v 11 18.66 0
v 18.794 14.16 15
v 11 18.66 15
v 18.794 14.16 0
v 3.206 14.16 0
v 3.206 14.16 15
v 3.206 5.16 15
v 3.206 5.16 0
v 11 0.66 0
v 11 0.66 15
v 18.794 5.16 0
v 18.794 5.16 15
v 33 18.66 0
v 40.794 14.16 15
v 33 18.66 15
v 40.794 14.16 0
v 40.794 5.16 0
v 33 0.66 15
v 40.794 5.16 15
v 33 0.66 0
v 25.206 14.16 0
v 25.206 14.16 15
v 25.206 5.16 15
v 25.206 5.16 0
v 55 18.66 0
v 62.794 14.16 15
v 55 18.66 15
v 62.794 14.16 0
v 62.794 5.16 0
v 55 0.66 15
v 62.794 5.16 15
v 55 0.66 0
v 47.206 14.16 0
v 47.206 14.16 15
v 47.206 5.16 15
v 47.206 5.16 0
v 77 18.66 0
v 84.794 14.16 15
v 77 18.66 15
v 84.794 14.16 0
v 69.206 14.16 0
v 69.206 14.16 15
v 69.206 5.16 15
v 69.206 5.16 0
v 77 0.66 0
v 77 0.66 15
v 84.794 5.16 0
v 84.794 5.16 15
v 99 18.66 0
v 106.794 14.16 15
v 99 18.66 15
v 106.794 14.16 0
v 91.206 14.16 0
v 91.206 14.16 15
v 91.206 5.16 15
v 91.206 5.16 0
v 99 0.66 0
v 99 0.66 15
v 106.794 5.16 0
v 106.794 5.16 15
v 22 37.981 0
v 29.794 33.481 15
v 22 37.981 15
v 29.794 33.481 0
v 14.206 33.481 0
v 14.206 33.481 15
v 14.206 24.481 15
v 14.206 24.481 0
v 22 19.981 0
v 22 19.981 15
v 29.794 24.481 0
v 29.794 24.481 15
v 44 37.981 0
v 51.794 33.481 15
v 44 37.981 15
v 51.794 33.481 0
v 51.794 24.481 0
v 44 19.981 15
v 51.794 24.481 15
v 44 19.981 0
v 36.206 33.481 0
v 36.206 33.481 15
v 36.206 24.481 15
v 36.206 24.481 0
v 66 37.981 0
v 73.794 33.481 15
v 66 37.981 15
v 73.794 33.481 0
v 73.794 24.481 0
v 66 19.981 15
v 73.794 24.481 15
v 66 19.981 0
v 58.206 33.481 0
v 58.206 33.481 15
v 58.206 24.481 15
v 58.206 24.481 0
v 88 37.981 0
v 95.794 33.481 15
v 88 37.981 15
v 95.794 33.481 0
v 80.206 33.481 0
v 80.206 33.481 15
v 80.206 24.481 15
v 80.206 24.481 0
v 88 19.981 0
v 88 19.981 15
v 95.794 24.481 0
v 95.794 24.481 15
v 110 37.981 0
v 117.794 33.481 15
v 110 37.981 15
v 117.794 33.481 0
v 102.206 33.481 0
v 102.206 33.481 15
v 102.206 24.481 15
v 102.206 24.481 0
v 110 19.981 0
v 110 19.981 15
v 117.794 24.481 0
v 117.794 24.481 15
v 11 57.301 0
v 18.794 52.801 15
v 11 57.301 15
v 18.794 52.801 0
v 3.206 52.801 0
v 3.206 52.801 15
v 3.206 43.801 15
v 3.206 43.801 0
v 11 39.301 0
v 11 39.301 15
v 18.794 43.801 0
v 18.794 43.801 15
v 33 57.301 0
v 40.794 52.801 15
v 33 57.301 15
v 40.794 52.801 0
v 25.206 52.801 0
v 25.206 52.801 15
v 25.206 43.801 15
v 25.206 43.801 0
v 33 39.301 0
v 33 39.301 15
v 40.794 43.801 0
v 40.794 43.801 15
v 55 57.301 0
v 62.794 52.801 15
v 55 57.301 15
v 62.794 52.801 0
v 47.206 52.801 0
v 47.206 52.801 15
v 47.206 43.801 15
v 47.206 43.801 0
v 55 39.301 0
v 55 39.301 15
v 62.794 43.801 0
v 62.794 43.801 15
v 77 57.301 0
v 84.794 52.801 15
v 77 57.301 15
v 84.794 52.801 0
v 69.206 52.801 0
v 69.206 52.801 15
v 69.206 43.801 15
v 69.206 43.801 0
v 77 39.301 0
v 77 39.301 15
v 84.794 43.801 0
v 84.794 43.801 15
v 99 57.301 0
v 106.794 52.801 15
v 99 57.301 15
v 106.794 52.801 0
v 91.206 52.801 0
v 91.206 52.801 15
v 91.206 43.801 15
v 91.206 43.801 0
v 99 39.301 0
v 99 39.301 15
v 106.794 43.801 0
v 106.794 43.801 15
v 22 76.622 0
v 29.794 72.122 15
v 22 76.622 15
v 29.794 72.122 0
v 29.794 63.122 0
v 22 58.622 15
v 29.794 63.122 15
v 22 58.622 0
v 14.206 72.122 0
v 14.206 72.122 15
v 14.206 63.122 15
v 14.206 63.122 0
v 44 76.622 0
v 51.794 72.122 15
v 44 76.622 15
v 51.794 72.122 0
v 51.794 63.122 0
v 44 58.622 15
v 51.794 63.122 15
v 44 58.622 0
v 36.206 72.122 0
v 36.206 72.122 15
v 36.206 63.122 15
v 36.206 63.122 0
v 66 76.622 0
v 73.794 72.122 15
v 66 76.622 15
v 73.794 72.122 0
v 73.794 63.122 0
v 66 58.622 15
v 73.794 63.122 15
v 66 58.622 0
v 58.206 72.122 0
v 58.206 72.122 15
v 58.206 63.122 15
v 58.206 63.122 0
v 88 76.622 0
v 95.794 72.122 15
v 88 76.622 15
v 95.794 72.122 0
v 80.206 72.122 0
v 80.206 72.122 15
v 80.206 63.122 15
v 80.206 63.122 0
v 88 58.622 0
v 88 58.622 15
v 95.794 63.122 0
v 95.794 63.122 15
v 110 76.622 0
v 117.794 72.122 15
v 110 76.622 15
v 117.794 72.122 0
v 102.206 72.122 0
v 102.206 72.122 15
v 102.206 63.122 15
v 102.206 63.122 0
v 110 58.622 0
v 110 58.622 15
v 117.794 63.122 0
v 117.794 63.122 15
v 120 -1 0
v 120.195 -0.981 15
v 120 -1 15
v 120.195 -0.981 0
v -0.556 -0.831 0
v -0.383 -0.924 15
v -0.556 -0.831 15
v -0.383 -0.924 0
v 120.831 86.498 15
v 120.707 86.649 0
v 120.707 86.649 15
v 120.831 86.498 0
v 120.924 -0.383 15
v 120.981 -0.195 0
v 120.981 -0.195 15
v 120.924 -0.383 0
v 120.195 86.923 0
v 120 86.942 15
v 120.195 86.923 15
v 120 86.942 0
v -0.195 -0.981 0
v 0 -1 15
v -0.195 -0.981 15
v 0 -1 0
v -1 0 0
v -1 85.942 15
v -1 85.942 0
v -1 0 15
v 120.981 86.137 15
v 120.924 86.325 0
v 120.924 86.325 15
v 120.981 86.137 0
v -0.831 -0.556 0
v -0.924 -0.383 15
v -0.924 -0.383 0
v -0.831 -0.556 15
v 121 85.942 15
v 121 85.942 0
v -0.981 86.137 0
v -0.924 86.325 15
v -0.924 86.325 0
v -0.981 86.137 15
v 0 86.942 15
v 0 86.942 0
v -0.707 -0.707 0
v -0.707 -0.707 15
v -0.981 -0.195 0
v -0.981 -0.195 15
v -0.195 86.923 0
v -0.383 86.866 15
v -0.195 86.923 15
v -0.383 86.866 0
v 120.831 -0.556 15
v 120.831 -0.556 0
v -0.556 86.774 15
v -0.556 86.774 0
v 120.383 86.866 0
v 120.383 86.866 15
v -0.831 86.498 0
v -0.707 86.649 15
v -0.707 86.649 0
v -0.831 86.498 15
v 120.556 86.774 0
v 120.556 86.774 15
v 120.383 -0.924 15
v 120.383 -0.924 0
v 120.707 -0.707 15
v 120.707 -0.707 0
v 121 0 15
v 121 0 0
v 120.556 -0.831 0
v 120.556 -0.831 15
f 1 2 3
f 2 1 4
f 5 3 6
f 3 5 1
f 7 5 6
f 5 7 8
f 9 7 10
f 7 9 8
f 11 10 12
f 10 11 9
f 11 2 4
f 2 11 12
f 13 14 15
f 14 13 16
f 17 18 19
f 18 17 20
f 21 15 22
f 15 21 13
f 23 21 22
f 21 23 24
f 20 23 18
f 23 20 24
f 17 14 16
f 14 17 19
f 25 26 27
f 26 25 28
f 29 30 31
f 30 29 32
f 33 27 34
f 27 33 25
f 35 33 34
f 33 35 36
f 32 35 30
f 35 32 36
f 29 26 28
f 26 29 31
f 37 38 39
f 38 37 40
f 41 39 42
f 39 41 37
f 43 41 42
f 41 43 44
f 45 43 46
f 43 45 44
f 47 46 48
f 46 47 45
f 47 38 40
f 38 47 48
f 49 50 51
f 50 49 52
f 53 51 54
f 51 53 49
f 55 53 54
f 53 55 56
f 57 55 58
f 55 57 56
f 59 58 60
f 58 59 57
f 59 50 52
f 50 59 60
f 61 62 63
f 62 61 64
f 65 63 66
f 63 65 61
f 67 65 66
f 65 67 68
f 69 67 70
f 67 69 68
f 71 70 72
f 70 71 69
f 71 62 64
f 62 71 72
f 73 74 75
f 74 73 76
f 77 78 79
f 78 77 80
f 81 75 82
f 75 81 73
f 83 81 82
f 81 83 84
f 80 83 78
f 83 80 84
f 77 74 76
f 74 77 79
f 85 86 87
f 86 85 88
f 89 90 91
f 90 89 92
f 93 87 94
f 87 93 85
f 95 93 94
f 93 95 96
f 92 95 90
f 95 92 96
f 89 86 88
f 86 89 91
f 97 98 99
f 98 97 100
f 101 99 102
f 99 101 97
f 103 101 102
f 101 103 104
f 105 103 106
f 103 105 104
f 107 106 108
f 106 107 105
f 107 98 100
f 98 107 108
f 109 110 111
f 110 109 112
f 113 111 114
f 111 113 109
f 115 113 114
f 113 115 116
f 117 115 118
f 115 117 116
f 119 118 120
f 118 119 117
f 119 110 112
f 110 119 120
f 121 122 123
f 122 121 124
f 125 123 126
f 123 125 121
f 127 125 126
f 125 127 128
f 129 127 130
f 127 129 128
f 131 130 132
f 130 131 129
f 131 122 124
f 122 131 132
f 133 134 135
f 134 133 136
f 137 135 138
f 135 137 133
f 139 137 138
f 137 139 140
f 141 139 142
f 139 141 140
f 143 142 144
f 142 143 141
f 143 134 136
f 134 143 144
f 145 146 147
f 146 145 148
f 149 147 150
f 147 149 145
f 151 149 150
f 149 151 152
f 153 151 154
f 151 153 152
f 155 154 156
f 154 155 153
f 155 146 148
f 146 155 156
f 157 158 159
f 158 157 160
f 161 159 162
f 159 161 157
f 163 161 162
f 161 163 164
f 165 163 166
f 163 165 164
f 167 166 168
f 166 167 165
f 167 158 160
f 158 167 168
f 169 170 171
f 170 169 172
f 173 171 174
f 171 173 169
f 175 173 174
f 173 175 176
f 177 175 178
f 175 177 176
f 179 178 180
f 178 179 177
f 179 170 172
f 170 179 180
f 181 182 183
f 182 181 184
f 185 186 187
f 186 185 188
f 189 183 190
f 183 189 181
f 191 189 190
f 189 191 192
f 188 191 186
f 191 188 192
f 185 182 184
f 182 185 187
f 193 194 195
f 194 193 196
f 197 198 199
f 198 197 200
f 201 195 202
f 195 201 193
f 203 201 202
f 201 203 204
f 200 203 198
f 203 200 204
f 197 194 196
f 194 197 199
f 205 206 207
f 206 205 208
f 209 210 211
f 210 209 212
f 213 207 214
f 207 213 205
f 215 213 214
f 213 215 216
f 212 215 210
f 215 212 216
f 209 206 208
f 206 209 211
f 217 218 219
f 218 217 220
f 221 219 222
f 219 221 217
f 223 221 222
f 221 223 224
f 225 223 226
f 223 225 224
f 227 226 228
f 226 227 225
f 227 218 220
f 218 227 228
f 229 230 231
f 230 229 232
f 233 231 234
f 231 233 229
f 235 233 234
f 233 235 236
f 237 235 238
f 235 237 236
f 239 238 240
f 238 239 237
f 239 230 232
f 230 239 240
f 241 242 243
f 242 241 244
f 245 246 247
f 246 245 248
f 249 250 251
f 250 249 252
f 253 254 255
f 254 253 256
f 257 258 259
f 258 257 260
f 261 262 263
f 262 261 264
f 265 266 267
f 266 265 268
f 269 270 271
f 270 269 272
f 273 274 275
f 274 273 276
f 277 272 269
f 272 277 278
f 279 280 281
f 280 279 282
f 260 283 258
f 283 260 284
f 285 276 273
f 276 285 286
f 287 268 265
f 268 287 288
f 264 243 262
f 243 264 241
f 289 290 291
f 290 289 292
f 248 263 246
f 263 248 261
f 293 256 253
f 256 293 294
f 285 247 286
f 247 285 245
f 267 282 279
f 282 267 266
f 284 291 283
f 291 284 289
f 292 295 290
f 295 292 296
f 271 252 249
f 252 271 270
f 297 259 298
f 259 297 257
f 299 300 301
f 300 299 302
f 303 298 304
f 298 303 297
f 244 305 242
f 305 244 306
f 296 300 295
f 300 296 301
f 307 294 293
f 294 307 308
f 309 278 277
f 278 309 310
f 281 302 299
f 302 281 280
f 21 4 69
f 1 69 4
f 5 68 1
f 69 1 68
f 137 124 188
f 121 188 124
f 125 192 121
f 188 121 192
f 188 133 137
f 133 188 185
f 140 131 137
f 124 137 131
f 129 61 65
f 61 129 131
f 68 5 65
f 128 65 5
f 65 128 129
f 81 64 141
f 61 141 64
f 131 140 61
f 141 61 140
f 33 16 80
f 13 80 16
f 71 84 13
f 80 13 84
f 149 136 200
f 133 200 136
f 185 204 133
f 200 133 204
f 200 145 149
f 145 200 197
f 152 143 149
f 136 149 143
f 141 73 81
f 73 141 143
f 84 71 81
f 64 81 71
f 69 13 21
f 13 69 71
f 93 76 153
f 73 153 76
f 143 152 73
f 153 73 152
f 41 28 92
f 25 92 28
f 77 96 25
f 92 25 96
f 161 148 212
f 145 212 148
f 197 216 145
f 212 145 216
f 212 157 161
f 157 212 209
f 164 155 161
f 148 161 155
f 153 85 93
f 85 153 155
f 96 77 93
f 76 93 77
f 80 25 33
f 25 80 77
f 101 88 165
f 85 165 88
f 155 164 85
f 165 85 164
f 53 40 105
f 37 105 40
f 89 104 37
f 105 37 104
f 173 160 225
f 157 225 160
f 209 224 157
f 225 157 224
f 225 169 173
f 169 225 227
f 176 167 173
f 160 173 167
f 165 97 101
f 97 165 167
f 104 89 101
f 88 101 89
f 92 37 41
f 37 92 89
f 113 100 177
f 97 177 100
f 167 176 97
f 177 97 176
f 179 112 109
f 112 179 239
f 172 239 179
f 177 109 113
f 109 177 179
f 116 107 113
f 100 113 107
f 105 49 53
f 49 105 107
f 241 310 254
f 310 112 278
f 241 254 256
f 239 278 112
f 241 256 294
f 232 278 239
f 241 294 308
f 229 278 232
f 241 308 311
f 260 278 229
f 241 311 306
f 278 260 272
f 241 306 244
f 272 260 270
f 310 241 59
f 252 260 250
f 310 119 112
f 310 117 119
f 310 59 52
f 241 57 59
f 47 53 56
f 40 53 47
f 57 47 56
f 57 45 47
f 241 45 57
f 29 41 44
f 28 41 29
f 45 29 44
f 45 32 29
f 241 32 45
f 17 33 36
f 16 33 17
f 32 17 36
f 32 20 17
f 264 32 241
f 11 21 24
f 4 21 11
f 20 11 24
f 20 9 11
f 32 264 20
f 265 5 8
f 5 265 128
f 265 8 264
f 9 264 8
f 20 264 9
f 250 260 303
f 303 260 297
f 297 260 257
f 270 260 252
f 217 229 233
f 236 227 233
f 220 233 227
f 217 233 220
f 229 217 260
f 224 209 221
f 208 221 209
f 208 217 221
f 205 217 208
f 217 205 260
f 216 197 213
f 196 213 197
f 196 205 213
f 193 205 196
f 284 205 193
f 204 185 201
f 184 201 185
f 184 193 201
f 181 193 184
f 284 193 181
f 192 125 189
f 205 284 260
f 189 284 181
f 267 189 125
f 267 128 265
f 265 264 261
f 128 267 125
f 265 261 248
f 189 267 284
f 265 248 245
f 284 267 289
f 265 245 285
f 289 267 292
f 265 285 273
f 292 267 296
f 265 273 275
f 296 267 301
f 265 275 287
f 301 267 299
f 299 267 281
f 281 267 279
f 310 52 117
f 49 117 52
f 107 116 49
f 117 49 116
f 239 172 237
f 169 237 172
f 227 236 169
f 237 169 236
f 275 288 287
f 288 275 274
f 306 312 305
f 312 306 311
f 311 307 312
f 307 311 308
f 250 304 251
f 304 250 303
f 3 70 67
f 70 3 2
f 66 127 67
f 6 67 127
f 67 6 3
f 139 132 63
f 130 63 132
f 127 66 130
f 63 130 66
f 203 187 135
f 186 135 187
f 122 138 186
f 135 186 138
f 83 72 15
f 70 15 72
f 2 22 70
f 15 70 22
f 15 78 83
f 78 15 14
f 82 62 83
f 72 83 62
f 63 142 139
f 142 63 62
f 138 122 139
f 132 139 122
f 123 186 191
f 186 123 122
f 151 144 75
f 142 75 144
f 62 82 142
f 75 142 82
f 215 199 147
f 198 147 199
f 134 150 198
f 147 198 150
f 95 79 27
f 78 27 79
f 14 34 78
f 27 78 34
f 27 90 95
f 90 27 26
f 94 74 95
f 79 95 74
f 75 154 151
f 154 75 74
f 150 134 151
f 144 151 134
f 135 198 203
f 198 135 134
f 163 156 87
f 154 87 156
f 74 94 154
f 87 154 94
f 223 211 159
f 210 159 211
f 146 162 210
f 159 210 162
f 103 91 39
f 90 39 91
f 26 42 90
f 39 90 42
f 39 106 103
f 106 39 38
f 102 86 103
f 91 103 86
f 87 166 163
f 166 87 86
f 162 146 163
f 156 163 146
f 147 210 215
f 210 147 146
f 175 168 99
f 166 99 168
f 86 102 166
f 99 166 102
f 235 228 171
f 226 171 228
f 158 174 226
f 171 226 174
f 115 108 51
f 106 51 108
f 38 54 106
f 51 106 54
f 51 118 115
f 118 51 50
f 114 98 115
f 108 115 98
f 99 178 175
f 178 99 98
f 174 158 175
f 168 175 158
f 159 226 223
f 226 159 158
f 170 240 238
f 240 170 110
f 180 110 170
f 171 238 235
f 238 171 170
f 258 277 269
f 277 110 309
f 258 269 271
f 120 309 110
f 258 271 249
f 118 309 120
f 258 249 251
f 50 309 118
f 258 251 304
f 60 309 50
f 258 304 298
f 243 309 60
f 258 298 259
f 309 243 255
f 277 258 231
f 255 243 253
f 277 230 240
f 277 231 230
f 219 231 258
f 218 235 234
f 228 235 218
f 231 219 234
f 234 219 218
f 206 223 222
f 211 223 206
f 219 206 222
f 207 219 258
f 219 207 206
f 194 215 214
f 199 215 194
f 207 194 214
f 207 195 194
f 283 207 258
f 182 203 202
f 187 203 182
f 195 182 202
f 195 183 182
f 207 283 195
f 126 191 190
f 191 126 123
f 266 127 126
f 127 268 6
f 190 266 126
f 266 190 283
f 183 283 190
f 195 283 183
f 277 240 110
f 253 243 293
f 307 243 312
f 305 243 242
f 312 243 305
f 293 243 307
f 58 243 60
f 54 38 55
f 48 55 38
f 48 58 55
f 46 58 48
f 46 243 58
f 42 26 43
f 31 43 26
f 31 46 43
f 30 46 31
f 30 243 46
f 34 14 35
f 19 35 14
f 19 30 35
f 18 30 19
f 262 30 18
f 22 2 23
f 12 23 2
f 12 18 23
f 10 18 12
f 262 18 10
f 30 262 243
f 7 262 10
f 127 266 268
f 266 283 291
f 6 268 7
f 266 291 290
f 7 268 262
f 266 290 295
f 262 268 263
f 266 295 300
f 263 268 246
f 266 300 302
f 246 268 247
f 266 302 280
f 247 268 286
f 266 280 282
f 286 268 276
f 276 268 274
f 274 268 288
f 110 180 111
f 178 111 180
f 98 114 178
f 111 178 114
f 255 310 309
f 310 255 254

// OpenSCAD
// Honeycomb Grid Pattern
// Creates hexagonal grid patterns for organizers, decorations, or infill
// License: CC0 (Public Domain)

/* [Grid Size] */
// Number of hexagons in X direction
cells_x = 5; // [2:20]

// Number of hexagons in Y direction
cells_y = 4; // [2:20]

// Size of each hexagon (flat-to-flat distance)
cell_size = 20; // [5:50]

/* [Dimensions] */
// Wall thickness between cells
wall_thickness = 2; // [1:0.5:5]

// Grid height (depth)
grid_height = 15; // [3:50]

// Add a bottom plate
include_bottom = "no"; // [yes, no]

// Bottom plate thickness
bottom_thickness = 1.5; // [0.5:0.5:5]

/* [Style] */
// Cell shape
cell_shape = "hexagon"; // [hexagon, circle, rounded_hex]

// Rounding for rounded_hex
hex_rounding = 2; // [0:5]

/* [Quality] */
// Render quality
$fn = 32; // [16:64]

/* [Hidden] */
// Hexagon math
hex_radius = cell_size / 2;
hex_apothem = hex_radius * cos(30);  // Distance from center to flat edge
col_spacing = cell_size + wall_thickness;
row_spacing = (hex_apothem * 2) + wall_thickness;

// Calculate overall dimensions
total_width = (cells_x * col_spacing) + (cell_size / 2);
total_depth = (cells_y * row_spacing) + hex_apothem;

module honeycomb_grid() {
    difference() {
        // Outer frame
        linear_extrude(height = grid_height)
            offset(r = wall_thickness/2)
            square([total_width, total_depth]);
        
        // Hexagonal cells
        translate([0, 0, include_bottom == "yes" ? bottom_thickness : -0.1])
            for (y = [0:cells_y-1]) {
                for (x = [0:cells_x-1]) {
                    translate([
                        hex_radius + wall_thickness/2 + (x * col_spacing) + ((y % 2) * (col_spacing / 2)),
                        hex_apothem + wall_thickness/2 + (y * row_spacing),
                        0
                    ])
                    create_cell(grid_height + 1);
                }
            }
    }
}

module create_cell(h) {
    if (cell_shape == "hexagon") {
        linear_extrude(height = h)
            hexagon(hex_radius - wall_thickness/2);
    } else if (cell_shape == "circle") {
        cylinder(r = hex_radius - wall_thickness/2, h = h);
    } else if (cell_shape == "rounded_hex") {
        linear_extrude(height = h)
            offset(r = hex_rounding)
            offset(r = -hex_rounding)
            hexagon(hex_radius - wall_thickness/2);
    }
}

module hexagon(radius) {
    polygon([
        for (i = [0:5])
            [radius * cos(60*i + 30), radius * sin(60*i + 30)]
    ]);
}

// Optional: Add reinforcement frame
module frame() {
    difference() {
        linear_extrude(height = grid_height)
            offset(r = wall_thickness)
            square([total_width, total_depth]);
        
        translate([wall_thickness, wall_thickness, -0.1])
            linear_extrude(height = grid_height + 0.2)
            square([total_width - wall_thickness, total_depth - wall_thickness]);
    }
}

// Render
honeycomb_grid();
